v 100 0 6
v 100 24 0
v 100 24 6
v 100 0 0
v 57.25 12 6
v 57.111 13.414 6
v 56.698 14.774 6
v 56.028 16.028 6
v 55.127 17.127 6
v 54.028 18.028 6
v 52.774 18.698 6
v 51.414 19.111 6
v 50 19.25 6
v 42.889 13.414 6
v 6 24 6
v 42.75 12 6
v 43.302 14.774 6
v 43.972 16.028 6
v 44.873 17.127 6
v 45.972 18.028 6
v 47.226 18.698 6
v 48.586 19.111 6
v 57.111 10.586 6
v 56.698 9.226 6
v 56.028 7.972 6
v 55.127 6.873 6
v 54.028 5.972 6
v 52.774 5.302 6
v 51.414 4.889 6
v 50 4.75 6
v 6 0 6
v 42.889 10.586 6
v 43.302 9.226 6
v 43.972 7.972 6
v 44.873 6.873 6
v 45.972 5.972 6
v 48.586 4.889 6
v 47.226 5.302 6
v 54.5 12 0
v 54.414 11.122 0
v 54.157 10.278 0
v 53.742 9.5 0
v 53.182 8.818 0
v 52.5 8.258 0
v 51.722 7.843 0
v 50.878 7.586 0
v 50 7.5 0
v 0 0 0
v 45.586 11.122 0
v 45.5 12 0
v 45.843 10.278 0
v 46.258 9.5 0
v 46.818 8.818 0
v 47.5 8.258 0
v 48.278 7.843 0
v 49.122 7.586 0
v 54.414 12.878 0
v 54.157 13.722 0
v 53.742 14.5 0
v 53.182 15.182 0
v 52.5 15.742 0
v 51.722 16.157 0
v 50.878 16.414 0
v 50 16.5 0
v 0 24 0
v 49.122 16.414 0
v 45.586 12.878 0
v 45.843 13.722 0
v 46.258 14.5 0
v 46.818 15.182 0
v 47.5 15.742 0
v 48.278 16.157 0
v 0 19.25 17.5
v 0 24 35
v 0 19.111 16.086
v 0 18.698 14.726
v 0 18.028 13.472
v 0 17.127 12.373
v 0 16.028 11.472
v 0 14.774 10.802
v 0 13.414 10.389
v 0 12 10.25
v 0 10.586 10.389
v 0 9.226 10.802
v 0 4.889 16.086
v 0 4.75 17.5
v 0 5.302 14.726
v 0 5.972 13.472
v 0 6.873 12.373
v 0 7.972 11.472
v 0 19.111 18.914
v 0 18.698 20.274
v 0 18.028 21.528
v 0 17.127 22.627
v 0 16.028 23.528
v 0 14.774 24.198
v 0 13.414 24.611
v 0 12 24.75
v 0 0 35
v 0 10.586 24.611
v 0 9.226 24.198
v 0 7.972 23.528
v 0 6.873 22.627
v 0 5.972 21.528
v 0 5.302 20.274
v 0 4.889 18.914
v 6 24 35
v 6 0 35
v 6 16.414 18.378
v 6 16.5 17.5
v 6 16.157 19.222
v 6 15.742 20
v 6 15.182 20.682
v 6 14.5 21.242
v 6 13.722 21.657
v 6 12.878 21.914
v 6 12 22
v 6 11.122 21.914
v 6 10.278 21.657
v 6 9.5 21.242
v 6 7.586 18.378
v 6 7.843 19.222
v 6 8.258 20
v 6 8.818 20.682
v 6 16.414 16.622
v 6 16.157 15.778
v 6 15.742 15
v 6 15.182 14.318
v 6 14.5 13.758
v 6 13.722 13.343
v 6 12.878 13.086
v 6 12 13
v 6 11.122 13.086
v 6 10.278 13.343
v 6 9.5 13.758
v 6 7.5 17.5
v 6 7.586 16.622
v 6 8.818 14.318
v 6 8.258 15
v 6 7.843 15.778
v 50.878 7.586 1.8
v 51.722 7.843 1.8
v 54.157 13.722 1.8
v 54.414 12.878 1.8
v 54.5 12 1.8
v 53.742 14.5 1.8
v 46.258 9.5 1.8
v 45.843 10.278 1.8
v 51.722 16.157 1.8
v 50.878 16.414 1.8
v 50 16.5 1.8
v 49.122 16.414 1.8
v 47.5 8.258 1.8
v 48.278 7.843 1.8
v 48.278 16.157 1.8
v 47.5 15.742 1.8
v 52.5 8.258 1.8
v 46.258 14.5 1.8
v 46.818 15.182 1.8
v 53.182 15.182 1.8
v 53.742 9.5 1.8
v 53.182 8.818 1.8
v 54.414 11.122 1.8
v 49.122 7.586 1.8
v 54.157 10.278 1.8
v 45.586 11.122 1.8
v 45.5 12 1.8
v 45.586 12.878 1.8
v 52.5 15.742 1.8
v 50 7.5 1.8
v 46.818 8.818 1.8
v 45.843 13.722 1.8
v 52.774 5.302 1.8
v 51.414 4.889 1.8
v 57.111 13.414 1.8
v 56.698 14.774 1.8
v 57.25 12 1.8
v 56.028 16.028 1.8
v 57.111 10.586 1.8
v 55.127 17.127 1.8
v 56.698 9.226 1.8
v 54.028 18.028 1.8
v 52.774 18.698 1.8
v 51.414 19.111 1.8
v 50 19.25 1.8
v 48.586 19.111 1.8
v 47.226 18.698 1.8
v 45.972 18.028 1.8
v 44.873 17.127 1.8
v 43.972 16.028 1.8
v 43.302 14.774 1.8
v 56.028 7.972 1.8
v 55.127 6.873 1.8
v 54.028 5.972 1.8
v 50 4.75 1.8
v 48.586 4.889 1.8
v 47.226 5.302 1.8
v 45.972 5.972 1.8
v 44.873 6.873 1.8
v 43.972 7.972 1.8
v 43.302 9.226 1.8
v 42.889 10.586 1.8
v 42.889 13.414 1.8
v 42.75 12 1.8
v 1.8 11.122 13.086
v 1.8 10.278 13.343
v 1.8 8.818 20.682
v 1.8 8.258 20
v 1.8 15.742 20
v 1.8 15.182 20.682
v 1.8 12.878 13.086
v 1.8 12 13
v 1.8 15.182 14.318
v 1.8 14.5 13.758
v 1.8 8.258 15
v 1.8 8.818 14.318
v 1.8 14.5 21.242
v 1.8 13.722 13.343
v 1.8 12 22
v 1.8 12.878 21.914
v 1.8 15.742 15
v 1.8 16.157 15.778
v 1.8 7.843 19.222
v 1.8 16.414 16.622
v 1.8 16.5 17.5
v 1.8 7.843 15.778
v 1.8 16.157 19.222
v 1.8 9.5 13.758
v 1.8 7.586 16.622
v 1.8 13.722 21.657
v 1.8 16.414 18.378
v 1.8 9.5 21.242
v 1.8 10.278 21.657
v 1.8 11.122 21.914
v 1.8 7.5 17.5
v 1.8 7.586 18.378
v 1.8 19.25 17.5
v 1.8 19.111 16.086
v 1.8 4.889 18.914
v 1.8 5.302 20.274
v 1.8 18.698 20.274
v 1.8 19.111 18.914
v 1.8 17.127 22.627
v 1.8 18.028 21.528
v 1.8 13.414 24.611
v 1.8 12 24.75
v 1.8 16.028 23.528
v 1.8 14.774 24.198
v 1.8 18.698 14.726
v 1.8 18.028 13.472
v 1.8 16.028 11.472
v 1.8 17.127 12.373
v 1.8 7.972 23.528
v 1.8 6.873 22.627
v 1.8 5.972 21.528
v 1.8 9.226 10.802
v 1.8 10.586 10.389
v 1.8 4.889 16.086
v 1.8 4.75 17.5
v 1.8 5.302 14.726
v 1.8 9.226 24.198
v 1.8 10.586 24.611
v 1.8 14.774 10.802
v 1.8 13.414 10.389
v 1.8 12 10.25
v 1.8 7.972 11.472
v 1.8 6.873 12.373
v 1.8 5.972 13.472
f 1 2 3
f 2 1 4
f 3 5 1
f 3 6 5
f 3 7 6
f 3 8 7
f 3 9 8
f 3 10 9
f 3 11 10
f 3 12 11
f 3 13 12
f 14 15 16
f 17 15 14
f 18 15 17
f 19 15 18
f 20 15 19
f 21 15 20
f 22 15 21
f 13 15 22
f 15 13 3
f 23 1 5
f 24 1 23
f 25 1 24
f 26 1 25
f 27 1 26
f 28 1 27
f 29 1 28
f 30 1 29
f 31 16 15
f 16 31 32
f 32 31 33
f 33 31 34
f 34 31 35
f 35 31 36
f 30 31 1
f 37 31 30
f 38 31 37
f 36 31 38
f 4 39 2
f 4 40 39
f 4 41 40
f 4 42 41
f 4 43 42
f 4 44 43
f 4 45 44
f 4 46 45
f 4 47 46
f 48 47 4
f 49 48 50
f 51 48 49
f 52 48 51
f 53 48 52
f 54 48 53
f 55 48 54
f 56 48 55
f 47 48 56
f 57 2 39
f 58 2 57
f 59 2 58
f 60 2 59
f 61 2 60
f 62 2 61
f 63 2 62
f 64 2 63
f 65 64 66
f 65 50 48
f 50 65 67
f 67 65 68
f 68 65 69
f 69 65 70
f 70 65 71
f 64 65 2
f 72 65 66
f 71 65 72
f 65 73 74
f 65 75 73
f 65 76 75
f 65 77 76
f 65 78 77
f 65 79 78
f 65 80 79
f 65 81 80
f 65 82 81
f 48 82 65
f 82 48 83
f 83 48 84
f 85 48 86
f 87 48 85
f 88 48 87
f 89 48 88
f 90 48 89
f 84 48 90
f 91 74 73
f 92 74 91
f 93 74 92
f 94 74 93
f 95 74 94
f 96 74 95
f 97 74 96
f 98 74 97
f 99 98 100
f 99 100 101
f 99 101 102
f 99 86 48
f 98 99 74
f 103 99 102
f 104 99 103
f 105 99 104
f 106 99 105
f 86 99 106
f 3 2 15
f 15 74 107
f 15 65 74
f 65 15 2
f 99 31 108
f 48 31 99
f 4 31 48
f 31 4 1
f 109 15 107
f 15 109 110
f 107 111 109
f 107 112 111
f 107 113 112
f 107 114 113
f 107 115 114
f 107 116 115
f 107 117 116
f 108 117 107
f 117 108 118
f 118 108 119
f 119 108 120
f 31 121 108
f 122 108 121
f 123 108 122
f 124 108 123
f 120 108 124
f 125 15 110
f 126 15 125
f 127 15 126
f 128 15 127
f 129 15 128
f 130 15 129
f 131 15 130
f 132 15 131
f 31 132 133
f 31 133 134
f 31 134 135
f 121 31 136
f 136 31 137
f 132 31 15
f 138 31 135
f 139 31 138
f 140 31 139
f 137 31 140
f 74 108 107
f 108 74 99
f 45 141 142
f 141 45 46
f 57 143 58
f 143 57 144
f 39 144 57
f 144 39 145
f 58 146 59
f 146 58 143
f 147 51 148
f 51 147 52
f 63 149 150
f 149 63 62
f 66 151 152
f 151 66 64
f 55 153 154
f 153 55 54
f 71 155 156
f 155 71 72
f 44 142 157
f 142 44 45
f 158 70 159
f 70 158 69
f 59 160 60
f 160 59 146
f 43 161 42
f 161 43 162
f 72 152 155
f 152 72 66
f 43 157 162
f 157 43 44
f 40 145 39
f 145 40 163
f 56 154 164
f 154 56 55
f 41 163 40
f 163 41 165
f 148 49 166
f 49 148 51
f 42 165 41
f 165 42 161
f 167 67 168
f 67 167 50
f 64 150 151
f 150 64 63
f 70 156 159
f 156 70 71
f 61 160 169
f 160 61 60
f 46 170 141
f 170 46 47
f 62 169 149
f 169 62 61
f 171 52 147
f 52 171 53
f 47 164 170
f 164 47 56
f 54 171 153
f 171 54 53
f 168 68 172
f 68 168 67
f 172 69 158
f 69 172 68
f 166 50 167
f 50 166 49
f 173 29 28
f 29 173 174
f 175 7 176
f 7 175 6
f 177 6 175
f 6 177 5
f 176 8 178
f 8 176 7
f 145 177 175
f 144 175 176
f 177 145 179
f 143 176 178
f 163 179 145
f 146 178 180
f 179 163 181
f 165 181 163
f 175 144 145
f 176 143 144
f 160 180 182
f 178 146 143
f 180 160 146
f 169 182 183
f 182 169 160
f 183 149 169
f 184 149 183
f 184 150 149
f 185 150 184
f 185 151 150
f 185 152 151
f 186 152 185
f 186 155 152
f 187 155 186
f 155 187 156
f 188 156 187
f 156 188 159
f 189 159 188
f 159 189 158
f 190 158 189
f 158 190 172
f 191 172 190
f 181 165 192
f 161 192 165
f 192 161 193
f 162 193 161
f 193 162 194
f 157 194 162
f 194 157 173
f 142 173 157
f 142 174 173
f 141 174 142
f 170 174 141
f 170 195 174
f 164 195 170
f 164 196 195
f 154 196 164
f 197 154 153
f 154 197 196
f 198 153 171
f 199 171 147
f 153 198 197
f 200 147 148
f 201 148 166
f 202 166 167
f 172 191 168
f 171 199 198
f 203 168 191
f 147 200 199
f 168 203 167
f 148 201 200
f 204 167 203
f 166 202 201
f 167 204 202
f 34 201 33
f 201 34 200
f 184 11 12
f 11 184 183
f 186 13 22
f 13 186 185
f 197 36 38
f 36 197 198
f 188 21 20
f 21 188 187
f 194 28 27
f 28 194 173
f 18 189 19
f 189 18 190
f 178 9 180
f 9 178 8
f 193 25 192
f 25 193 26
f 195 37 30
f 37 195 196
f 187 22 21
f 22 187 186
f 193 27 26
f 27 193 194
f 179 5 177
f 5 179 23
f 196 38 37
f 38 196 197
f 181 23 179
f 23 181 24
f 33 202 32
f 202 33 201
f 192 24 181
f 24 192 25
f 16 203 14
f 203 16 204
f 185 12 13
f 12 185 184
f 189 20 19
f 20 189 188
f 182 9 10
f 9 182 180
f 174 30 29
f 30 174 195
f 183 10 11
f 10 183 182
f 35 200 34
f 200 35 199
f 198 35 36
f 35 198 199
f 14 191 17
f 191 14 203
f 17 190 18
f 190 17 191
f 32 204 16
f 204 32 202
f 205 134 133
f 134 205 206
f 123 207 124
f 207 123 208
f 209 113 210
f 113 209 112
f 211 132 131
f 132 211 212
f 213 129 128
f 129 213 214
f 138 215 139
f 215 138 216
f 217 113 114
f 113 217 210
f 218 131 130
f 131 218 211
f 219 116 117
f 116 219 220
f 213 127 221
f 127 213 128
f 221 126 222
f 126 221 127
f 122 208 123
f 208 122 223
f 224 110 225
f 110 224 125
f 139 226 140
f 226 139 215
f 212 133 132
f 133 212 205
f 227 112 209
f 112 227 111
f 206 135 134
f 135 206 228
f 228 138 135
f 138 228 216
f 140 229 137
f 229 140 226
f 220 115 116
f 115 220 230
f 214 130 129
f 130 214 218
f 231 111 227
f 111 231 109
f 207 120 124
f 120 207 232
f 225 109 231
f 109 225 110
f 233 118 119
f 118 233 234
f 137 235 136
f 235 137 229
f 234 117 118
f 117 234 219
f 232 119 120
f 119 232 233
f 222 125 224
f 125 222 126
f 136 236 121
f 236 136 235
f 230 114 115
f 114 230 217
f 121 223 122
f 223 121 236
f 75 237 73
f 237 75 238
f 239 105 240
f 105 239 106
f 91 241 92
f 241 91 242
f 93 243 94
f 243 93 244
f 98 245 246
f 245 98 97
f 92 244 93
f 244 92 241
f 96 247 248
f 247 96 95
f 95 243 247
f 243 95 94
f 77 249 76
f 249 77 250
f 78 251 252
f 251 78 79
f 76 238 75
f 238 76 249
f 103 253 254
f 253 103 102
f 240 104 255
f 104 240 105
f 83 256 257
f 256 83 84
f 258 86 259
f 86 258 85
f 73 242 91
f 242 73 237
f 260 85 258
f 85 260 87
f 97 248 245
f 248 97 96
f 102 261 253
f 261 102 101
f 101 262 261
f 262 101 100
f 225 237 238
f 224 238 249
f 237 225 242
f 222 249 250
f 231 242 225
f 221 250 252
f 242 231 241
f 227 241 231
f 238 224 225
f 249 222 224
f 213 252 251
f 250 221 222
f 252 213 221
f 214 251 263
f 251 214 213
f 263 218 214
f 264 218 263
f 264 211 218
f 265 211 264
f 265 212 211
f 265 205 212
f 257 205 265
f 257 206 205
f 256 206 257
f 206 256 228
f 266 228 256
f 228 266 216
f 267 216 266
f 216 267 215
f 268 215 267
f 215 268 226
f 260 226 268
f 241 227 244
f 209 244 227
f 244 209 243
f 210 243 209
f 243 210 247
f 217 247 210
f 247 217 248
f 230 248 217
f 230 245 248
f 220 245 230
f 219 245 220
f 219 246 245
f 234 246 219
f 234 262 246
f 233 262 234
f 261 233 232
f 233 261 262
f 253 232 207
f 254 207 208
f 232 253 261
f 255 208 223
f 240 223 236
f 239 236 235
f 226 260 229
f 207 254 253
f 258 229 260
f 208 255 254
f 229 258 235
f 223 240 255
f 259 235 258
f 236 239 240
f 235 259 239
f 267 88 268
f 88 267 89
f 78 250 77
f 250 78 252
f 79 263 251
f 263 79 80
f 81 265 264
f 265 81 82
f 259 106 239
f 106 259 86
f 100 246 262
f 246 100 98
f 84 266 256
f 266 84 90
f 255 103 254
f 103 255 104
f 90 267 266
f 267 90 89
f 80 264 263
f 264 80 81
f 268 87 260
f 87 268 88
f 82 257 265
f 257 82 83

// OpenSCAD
$fn = 32;

// ----------------------------------------------------------------------
// L-bracket: 100 x 24 x 35 mm
// ----------------------------------------------------------------------

// --- parameters (mm) ---
run_out = 100;            // horizontal leg, X
rise = 35;                // vertical leg, Z
bracket_w = 24;           // bracket depth, Y
sheet_t = 6;              // plate thickness
hole_d = 9;               // clearance for M8
cb_d = 14.5;              // counterbore seat
cb_h = 4.2;               // counterbore depth

module hole_z(px, py) {
  translate([px, py, -2.5]) cylinder(h = sheet_t + 5, d = hole_d);
}
module hole_x(pz, py) {
  translate([-2.5, py, pz]) rotate([0, 90, 0]) cylinder(h = sheet_t + 5, d = hole_d);
}
module cb_z(px, py) {
  translate([px, py, sheet_t - cb_h]) cylinder(h = cb_h + 0.4, d = cb_d);
}
module cb_x(pz, py) {
  translate([sheet_t - cb_h, py, pz]) rotate([0, -90, 0]) cylinder(h = cb_h + 0.4, d = cb_d);
}

difference() {
  union() {
    /* horizontal leg */
    cube([run_out, bracket_w, sheet_t]);
    /* vertical leg, overlapping the corner block */
    cube([sheet_t, bracket_w, rise]);
  }
  hole_z(50, 12);
  cb_z(50, 12);
  hole_x(17.5, 12);
  cb_x(17.5, 12);
}
